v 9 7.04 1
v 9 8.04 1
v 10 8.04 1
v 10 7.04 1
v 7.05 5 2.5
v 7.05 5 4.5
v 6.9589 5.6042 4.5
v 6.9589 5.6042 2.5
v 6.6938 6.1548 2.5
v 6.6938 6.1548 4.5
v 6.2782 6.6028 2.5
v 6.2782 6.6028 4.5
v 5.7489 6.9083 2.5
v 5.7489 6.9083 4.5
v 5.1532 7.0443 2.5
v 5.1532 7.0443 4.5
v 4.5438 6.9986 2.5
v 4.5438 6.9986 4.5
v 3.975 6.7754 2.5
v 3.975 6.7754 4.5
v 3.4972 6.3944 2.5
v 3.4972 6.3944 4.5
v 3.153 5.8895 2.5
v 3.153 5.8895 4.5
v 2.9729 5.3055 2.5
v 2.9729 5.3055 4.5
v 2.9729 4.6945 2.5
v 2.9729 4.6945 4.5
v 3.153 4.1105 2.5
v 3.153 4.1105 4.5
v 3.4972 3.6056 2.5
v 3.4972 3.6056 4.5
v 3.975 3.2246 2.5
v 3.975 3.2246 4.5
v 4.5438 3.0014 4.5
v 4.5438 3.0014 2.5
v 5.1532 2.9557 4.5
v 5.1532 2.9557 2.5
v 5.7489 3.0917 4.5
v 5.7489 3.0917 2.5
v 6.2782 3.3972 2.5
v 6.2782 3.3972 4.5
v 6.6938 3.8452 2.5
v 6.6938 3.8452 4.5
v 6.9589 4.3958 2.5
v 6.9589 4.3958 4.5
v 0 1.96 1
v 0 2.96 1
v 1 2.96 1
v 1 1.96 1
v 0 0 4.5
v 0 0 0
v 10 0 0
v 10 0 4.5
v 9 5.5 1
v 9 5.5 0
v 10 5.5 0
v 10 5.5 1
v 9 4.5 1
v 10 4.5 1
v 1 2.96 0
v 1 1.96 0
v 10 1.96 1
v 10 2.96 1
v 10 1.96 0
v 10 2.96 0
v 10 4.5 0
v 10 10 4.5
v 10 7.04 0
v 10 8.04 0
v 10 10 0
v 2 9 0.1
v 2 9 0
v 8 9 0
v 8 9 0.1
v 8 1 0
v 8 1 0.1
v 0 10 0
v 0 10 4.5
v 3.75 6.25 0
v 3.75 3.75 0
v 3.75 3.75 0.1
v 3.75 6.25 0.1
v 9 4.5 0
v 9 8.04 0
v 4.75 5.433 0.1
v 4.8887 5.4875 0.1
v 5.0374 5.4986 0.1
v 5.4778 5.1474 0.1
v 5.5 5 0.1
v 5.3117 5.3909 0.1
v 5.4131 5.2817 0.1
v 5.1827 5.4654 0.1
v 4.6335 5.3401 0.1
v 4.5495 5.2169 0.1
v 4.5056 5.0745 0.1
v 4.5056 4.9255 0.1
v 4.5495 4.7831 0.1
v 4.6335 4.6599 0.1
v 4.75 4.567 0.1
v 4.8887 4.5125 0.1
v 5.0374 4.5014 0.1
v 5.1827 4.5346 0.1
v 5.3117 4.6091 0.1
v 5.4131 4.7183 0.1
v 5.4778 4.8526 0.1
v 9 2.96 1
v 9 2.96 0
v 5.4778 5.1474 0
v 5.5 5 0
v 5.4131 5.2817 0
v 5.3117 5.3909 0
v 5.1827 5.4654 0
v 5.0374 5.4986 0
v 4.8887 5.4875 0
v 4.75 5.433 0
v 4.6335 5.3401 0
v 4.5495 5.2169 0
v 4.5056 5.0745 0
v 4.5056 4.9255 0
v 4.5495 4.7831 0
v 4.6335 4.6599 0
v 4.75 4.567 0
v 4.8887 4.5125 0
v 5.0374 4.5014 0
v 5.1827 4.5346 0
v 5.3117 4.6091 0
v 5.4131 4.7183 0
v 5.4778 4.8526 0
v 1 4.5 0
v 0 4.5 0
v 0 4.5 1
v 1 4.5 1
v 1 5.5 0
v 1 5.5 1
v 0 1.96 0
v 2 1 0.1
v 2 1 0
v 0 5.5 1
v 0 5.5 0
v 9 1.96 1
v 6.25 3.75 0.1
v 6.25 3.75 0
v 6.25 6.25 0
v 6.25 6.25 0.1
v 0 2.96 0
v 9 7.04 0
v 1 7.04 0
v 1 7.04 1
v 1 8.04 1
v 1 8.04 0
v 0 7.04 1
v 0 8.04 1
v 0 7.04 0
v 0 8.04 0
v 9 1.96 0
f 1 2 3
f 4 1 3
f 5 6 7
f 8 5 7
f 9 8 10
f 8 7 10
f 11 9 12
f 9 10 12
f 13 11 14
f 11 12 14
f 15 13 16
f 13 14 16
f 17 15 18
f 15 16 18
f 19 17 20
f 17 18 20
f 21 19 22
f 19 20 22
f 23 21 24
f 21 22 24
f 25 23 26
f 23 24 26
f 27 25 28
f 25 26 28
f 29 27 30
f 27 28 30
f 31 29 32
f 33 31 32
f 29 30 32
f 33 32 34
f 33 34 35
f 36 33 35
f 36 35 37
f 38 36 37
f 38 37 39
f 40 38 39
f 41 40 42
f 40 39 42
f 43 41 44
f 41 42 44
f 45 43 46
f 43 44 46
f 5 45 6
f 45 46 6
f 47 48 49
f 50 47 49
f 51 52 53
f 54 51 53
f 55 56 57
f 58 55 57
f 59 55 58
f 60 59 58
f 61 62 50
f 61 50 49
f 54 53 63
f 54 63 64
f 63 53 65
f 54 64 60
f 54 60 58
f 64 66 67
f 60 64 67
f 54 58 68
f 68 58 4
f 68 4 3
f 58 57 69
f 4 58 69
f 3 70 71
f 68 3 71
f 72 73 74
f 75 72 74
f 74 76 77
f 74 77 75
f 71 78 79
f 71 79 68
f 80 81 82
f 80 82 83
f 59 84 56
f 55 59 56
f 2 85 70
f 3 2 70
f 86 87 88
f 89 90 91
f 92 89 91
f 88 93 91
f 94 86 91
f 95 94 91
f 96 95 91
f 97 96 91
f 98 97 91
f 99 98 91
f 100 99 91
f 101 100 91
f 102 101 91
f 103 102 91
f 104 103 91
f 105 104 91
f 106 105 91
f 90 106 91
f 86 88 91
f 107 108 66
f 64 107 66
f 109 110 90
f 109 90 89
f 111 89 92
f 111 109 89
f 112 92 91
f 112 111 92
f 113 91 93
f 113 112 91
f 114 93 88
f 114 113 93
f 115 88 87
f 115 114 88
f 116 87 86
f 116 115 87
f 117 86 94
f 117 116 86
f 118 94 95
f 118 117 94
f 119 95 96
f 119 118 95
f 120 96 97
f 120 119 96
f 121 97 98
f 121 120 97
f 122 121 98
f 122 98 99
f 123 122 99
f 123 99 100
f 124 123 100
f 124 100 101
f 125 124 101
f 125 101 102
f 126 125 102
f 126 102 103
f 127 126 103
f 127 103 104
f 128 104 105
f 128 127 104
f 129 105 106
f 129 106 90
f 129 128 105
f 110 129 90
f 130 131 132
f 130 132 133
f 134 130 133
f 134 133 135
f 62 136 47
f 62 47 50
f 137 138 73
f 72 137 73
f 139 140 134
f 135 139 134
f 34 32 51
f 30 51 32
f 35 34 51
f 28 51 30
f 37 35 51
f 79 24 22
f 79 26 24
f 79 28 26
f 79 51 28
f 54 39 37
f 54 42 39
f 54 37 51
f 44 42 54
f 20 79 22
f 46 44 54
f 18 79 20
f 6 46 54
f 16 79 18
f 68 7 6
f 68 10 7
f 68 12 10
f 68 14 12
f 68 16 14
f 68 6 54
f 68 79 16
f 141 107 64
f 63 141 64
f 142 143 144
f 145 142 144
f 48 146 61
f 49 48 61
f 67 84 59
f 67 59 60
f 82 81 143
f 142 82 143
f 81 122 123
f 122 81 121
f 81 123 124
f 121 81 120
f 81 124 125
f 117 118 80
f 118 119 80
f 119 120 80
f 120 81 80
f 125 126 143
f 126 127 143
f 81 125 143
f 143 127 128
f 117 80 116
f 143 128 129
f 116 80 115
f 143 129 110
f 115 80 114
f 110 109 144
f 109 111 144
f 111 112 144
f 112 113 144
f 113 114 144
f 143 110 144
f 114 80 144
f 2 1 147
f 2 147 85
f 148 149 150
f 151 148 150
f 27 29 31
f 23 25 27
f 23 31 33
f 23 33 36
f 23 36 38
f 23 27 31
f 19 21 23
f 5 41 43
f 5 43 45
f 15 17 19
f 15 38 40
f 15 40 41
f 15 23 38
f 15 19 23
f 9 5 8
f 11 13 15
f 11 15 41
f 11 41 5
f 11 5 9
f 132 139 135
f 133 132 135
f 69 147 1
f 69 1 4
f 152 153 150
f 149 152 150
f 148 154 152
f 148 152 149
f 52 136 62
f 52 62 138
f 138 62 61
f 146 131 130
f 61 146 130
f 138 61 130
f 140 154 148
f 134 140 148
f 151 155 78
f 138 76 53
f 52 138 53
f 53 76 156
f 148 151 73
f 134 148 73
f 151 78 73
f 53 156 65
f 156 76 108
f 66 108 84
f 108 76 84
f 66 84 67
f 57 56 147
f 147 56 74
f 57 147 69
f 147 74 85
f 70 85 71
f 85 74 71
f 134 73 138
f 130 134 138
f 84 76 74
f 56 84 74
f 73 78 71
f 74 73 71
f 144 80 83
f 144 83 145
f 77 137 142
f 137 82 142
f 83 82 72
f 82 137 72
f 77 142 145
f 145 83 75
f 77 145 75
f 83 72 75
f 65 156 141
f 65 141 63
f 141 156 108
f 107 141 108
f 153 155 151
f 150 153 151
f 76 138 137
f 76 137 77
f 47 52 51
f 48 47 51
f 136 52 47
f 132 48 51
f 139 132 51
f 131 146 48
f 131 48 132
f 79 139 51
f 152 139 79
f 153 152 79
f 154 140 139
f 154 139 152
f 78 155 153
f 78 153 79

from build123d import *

# Parameters (mm, degrees)
SKETCH_W        = 10
SKETCH_H        = 10
PAD_DEPTH       = 4.5
SKETCH001_R     = 2.05
POCKET_DEPTH    = 2
SKETCH006_W     = 6
SKETCH006_H     = 8
SKETCH006_W_2   = 2.5
SKETCH006_H_2   = 2.5
POCKET003_DEPTH = 0.1
SKETCH007_R     = 0.5
POCKET004_DEPTH = 0.1
SKETCH008_W     = 1
SKETCH008_H     = 1
POCKET005_DEPTH = 1


with BuildPart() as part:
    # Sketch → Pad (new body)
    with BuildSketch(Plane.XY):
        with Locations((5, 5)):
            Rectangle(SKETCH_W, SKETCH_H)
    extrude(amount=PAD_DEPTH)

    # Sketch001 (on Face6 of Pad) → Pocket (cut)
    with BuildSketch(Plane.XY.offset(4.5)):
        with Locations((5, 5)):
            Circle(SKETCH001_R)
    extrude(amount=-POCKET_DEPTH, mode=Mode.SUBTRACT)

    # Sketch006 → Pocket003 (cut)
    with BuildSketch(Plane.XY):
        with Locations((5, 5)):
            Rectangle(SKETCH006_W, SKETCH006_H)
        with Locations((5, 5)):
            Rectangle(SKETCH006_W_2, SKETCH006_H_2, mode=Mode.SUBTRACT)
    extrude(amount=POCKET003_DEPTH, mode=Mode.SUBTRACT)

    # Sketch007 → Pocket004 (cut)
    with BuildSketch(Plane.XY):
        with Locations((5, 5)):
            Circle(SKETCH007_R)
    extrude(amount=POCKET004_DEPTH, mode=Mode.SUBTRACT)

    # Sketch008 → Pocket005 (cut)
    with BuildSketch(Plane.XY):
        with Locations((0.5, 7.54)):
            Rectangle(SKETCH008_W, SKETCH008_H)
        with Locations((0.5, 5)):
            Rectangle(SKETCH008_W, SKETCH008_H)
        with Locations((0.5, 2.46)):
            Rectangle(SKETCH008_W, SKETCH008_H)
        with Locations((9.5, 7.54)):
            Rectangle(SKETCH008_W, SKETCH008_H)
        with Locations((9.5, 5)):
            Rectangle(SKETCH008_W, SKETCH008_H)
        with Locations((9.5, 2.46)):
            Rectangle(SKETCH008_W, SKETCH008_H)
    extrude(amount=POCKET005_DEPTH, mode=Mode.SUBTRACT)


solid = part.part
